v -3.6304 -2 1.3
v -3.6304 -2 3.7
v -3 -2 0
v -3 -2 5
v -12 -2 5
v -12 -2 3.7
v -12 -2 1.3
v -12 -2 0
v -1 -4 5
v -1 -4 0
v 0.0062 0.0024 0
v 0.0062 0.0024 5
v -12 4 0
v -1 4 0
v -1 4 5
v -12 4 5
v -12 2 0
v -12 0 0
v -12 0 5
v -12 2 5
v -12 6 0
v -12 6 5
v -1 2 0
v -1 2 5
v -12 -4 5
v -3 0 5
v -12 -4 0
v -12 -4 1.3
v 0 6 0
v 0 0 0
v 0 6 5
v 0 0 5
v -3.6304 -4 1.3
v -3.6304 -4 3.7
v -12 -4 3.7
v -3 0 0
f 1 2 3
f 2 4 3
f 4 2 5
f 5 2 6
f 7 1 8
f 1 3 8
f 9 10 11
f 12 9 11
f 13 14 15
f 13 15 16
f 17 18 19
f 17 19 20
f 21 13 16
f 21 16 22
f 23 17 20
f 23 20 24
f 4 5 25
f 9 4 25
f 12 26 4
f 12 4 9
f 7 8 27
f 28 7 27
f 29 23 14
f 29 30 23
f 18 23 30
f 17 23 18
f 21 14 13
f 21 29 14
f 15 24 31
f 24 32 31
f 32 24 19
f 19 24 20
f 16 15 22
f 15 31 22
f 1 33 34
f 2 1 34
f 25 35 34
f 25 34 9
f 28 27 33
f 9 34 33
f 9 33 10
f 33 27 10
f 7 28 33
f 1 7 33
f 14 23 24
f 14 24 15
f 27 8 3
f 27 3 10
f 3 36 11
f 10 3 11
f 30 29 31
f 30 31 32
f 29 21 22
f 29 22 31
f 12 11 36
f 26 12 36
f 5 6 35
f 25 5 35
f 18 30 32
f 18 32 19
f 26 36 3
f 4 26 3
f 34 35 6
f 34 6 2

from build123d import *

# Parameters (mm, degrees)
PAD_DEPTH        = 5
SKETCH002_W      = 8.369602
SKETCH002_H      = 2.4
EXTRUDE001_DEPTH = 3
EXTRUDE_DEPTH    = 5


with BuildPart() as body:
    # Sketch → Pad (new body)
    with BuildSketch(Plane.XY):
        Polygon((-12, 6), (0, 6), (0, 0), (-12, 0), (-12, 2), (-1, 2), (-1, 4), (-12, 4), align=None)
    extrude(amount=PAD_DEPTH)


with BuildPart() as extrude001:
    # Sketch002 (on DatumPlane) → Extrude001 (new body)
    with BuildSketch(Plane.XZ.offset(4)):
        with Locations((-7.815199, 2.5)):
            Rectangle(SKETCH002_W, SKETCH002_H)
    extrude(amount=-EXTRUDE001_DEPTH)


with BuildPart() as cut:
    # Sketch001 → Extrude (new body)
    with BuildSketch(Plane(origin=(-1, 0, 0), x_dir=(1, 0, 0), z_dir=(0, 0, 1))):
        Polygon((-2, 0), (-2, -2), (-11, -2), (-11, -4), (0, -4), (1.006215, 0.002421), align=None)
    extrude(amount=EXTRUDE_DEPTH)

    # Cut: cut Extrude001
    add(extrude001.part, mode=Mode.SUBTRACT)


solid = Compound([body.part, cut.part])
